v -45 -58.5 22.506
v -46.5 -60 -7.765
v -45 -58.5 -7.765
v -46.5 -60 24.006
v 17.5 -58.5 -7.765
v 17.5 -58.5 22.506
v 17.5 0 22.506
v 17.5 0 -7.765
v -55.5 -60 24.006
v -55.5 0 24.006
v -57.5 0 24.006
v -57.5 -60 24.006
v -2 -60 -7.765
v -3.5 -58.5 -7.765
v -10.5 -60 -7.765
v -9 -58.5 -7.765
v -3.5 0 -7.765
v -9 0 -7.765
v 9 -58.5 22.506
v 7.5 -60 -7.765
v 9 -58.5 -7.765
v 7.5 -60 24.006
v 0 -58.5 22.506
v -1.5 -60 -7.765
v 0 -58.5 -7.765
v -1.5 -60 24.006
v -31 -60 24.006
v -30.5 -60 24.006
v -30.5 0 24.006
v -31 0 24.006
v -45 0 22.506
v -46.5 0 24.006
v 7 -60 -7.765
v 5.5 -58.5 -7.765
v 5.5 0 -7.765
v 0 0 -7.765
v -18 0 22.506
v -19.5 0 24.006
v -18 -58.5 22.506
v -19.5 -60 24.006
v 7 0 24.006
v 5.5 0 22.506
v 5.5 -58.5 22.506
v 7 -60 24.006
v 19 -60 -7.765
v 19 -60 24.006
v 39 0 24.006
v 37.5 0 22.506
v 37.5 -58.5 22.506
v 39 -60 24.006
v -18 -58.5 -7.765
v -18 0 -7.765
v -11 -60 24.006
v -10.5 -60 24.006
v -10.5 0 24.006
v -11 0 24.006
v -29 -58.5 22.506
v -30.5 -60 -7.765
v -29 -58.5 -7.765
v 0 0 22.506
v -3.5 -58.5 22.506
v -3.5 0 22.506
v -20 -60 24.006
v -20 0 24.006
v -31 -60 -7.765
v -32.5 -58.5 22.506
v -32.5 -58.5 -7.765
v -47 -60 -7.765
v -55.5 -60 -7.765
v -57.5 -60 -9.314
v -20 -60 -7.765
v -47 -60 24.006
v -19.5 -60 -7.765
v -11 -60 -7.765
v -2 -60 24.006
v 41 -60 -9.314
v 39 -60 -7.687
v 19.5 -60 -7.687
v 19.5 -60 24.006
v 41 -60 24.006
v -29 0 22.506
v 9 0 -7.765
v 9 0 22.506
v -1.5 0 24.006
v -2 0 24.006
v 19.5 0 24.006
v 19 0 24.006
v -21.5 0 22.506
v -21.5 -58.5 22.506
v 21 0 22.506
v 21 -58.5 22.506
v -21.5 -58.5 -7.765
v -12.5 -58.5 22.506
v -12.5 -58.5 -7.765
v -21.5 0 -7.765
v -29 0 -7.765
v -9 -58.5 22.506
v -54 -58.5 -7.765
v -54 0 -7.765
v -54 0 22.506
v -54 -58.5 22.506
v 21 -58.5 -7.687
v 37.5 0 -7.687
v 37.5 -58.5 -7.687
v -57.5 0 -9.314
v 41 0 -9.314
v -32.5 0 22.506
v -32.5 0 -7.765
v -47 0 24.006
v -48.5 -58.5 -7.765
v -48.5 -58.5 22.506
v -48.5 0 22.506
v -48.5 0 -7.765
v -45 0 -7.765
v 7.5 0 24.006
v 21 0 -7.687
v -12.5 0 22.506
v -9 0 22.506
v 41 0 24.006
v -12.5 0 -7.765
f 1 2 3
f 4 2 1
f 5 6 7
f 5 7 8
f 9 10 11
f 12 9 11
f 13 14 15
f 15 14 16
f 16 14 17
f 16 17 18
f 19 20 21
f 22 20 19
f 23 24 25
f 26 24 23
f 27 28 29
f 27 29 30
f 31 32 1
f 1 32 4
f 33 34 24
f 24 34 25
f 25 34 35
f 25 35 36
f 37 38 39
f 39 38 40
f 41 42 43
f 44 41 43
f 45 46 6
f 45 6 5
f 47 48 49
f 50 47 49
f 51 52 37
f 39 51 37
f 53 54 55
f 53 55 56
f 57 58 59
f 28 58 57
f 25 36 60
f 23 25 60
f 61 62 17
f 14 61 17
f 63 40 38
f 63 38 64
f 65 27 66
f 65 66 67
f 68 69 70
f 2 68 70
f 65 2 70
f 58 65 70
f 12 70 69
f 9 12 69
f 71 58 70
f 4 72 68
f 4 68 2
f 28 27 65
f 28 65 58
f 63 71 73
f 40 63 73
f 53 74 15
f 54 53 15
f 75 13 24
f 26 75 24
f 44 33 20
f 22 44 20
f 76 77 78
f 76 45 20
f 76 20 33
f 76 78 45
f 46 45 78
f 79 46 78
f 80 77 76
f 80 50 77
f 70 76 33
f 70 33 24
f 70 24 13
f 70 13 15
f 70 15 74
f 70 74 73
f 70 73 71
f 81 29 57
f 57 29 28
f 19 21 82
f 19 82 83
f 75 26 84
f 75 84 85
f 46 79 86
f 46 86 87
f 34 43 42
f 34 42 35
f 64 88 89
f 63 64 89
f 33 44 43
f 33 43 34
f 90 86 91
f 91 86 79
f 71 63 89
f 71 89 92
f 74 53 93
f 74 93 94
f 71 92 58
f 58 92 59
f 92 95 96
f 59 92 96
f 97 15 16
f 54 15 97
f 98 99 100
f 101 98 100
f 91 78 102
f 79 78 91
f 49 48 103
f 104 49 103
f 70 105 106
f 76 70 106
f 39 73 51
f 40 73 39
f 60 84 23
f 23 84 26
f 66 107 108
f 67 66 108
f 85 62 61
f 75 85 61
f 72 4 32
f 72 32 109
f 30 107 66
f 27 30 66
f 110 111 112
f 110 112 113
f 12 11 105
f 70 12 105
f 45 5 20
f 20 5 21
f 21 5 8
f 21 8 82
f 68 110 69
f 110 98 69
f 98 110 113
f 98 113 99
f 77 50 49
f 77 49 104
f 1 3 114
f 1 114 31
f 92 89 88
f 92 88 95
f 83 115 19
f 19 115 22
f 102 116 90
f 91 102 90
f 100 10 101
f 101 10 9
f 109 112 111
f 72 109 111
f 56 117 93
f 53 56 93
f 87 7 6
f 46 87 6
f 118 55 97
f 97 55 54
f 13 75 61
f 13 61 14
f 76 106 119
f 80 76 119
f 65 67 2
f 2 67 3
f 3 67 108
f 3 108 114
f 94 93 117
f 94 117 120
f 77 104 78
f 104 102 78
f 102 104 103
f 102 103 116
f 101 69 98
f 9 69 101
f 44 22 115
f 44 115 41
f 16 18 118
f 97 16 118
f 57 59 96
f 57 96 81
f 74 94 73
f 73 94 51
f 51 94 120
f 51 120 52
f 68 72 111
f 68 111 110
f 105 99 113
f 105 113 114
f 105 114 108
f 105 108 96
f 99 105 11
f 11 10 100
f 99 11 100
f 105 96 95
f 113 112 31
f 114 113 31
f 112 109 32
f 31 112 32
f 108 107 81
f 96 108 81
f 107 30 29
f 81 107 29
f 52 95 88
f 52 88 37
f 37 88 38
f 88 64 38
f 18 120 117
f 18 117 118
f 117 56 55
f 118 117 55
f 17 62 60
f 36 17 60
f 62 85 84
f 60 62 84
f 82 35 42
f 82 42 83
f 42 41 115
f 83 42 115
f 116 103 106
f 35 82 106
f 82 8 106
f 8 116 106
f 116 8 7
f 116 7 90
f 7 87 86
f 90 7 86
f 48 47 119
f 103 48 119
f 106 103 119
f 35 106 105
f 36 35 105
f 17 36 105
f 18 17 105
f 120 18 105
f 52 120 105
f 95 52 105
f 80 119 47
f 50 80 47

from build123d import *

# Parameters (mm, degrees)
F1_DEPTH = 60
F2_SIZE  = 1.5


with BuildPart() as f1:
    # F0 (on Front) → F1 (new body)
    with BuildSketch(Plane.XZ):
        Polygon((-57.5, 24.006124), (-57.5, -9.314226), (41, -9.314226), (41, 24.006124), (37.5, 24.006124), (37.5, -7.686828), (21, -7.686828), (21, 24.006124), (17.5, 24.006124), (17.5, -7.764603), (9, -7.764603), (9, 24.006124), (5.5, 24.006124), (5.5, -7.764603), (0, -7.764603), (0, 24.006124), (-3.5, 24.006124), (-3.5, -7.764603), (-9, -7.764603), (-9, 24.006124), (-12.5, 24.006124), (-12.5, -7.764603), (-18, -7.764603), (-18, 24.006124), (-21.5, 24.006124), (-21.5, -7.764603), (-29, -7.764603), (-29, 24.006124), (-32.5, 24.006124), (-32.5, -7.764603), (-45, -7.764603), (-45, 24.006124), (-48.5, 24.006124), (-48.5, -7.764603), (-54, -7.764603), (-54, 24.006124), align=None)
    extrude(amount=F1_DEPTH)

    # F2
    f2_edges = [f1.edges().sort_by_distance(p)[0] for p in [
        (37.5, -30, 24.006124),
        (21, -30, 24.006124),
        (17.5, -30, 24.006124),
        (9, -30, 24.006124),
        (5.5, -30, 24.006124),
        (0, -30, 24.006124),
        (-3.5, -30, 24.006124),
        (-9, -30, 24.006124),
        (-12.5, -30, 24.006124),
        (-18, -30, 24.006124),
        (-21.5, -30, 24.006124),
        (-29, -30, 24.006124),
        (-32.5, -30, 24.006124),
        (-45, -30, 24.006124),
        (-48.5, -30, 24.006124),
        (-54, -30, 24.006124),
        (9, -60, 8.120761),
        (5.5, -60, 8.120761),
        (37.5, -60, 8.159648),
        (21, -60, 8.159648),
        (17.5, -60, 8.120761),
        (0, -60, 8.120761),
        (-3.5, -60, 8.120761),
        (-12.5, -60, 8.120761),
        (-18, -60, 8.120761),
        (-21.5, -60, 8.120761),
        (-29, -60, 8.120761),
        (-32.5, -60, 8.120761),
        (-45, -60, 8.120761),
        (-48.5, -60, 8.120761),
        (-54, -60, 8.120761),
        (-9, -60, 8.120761),
    ]]
    chamfer(f2_edges, length=F2_SIZE)


solid = f1.part
